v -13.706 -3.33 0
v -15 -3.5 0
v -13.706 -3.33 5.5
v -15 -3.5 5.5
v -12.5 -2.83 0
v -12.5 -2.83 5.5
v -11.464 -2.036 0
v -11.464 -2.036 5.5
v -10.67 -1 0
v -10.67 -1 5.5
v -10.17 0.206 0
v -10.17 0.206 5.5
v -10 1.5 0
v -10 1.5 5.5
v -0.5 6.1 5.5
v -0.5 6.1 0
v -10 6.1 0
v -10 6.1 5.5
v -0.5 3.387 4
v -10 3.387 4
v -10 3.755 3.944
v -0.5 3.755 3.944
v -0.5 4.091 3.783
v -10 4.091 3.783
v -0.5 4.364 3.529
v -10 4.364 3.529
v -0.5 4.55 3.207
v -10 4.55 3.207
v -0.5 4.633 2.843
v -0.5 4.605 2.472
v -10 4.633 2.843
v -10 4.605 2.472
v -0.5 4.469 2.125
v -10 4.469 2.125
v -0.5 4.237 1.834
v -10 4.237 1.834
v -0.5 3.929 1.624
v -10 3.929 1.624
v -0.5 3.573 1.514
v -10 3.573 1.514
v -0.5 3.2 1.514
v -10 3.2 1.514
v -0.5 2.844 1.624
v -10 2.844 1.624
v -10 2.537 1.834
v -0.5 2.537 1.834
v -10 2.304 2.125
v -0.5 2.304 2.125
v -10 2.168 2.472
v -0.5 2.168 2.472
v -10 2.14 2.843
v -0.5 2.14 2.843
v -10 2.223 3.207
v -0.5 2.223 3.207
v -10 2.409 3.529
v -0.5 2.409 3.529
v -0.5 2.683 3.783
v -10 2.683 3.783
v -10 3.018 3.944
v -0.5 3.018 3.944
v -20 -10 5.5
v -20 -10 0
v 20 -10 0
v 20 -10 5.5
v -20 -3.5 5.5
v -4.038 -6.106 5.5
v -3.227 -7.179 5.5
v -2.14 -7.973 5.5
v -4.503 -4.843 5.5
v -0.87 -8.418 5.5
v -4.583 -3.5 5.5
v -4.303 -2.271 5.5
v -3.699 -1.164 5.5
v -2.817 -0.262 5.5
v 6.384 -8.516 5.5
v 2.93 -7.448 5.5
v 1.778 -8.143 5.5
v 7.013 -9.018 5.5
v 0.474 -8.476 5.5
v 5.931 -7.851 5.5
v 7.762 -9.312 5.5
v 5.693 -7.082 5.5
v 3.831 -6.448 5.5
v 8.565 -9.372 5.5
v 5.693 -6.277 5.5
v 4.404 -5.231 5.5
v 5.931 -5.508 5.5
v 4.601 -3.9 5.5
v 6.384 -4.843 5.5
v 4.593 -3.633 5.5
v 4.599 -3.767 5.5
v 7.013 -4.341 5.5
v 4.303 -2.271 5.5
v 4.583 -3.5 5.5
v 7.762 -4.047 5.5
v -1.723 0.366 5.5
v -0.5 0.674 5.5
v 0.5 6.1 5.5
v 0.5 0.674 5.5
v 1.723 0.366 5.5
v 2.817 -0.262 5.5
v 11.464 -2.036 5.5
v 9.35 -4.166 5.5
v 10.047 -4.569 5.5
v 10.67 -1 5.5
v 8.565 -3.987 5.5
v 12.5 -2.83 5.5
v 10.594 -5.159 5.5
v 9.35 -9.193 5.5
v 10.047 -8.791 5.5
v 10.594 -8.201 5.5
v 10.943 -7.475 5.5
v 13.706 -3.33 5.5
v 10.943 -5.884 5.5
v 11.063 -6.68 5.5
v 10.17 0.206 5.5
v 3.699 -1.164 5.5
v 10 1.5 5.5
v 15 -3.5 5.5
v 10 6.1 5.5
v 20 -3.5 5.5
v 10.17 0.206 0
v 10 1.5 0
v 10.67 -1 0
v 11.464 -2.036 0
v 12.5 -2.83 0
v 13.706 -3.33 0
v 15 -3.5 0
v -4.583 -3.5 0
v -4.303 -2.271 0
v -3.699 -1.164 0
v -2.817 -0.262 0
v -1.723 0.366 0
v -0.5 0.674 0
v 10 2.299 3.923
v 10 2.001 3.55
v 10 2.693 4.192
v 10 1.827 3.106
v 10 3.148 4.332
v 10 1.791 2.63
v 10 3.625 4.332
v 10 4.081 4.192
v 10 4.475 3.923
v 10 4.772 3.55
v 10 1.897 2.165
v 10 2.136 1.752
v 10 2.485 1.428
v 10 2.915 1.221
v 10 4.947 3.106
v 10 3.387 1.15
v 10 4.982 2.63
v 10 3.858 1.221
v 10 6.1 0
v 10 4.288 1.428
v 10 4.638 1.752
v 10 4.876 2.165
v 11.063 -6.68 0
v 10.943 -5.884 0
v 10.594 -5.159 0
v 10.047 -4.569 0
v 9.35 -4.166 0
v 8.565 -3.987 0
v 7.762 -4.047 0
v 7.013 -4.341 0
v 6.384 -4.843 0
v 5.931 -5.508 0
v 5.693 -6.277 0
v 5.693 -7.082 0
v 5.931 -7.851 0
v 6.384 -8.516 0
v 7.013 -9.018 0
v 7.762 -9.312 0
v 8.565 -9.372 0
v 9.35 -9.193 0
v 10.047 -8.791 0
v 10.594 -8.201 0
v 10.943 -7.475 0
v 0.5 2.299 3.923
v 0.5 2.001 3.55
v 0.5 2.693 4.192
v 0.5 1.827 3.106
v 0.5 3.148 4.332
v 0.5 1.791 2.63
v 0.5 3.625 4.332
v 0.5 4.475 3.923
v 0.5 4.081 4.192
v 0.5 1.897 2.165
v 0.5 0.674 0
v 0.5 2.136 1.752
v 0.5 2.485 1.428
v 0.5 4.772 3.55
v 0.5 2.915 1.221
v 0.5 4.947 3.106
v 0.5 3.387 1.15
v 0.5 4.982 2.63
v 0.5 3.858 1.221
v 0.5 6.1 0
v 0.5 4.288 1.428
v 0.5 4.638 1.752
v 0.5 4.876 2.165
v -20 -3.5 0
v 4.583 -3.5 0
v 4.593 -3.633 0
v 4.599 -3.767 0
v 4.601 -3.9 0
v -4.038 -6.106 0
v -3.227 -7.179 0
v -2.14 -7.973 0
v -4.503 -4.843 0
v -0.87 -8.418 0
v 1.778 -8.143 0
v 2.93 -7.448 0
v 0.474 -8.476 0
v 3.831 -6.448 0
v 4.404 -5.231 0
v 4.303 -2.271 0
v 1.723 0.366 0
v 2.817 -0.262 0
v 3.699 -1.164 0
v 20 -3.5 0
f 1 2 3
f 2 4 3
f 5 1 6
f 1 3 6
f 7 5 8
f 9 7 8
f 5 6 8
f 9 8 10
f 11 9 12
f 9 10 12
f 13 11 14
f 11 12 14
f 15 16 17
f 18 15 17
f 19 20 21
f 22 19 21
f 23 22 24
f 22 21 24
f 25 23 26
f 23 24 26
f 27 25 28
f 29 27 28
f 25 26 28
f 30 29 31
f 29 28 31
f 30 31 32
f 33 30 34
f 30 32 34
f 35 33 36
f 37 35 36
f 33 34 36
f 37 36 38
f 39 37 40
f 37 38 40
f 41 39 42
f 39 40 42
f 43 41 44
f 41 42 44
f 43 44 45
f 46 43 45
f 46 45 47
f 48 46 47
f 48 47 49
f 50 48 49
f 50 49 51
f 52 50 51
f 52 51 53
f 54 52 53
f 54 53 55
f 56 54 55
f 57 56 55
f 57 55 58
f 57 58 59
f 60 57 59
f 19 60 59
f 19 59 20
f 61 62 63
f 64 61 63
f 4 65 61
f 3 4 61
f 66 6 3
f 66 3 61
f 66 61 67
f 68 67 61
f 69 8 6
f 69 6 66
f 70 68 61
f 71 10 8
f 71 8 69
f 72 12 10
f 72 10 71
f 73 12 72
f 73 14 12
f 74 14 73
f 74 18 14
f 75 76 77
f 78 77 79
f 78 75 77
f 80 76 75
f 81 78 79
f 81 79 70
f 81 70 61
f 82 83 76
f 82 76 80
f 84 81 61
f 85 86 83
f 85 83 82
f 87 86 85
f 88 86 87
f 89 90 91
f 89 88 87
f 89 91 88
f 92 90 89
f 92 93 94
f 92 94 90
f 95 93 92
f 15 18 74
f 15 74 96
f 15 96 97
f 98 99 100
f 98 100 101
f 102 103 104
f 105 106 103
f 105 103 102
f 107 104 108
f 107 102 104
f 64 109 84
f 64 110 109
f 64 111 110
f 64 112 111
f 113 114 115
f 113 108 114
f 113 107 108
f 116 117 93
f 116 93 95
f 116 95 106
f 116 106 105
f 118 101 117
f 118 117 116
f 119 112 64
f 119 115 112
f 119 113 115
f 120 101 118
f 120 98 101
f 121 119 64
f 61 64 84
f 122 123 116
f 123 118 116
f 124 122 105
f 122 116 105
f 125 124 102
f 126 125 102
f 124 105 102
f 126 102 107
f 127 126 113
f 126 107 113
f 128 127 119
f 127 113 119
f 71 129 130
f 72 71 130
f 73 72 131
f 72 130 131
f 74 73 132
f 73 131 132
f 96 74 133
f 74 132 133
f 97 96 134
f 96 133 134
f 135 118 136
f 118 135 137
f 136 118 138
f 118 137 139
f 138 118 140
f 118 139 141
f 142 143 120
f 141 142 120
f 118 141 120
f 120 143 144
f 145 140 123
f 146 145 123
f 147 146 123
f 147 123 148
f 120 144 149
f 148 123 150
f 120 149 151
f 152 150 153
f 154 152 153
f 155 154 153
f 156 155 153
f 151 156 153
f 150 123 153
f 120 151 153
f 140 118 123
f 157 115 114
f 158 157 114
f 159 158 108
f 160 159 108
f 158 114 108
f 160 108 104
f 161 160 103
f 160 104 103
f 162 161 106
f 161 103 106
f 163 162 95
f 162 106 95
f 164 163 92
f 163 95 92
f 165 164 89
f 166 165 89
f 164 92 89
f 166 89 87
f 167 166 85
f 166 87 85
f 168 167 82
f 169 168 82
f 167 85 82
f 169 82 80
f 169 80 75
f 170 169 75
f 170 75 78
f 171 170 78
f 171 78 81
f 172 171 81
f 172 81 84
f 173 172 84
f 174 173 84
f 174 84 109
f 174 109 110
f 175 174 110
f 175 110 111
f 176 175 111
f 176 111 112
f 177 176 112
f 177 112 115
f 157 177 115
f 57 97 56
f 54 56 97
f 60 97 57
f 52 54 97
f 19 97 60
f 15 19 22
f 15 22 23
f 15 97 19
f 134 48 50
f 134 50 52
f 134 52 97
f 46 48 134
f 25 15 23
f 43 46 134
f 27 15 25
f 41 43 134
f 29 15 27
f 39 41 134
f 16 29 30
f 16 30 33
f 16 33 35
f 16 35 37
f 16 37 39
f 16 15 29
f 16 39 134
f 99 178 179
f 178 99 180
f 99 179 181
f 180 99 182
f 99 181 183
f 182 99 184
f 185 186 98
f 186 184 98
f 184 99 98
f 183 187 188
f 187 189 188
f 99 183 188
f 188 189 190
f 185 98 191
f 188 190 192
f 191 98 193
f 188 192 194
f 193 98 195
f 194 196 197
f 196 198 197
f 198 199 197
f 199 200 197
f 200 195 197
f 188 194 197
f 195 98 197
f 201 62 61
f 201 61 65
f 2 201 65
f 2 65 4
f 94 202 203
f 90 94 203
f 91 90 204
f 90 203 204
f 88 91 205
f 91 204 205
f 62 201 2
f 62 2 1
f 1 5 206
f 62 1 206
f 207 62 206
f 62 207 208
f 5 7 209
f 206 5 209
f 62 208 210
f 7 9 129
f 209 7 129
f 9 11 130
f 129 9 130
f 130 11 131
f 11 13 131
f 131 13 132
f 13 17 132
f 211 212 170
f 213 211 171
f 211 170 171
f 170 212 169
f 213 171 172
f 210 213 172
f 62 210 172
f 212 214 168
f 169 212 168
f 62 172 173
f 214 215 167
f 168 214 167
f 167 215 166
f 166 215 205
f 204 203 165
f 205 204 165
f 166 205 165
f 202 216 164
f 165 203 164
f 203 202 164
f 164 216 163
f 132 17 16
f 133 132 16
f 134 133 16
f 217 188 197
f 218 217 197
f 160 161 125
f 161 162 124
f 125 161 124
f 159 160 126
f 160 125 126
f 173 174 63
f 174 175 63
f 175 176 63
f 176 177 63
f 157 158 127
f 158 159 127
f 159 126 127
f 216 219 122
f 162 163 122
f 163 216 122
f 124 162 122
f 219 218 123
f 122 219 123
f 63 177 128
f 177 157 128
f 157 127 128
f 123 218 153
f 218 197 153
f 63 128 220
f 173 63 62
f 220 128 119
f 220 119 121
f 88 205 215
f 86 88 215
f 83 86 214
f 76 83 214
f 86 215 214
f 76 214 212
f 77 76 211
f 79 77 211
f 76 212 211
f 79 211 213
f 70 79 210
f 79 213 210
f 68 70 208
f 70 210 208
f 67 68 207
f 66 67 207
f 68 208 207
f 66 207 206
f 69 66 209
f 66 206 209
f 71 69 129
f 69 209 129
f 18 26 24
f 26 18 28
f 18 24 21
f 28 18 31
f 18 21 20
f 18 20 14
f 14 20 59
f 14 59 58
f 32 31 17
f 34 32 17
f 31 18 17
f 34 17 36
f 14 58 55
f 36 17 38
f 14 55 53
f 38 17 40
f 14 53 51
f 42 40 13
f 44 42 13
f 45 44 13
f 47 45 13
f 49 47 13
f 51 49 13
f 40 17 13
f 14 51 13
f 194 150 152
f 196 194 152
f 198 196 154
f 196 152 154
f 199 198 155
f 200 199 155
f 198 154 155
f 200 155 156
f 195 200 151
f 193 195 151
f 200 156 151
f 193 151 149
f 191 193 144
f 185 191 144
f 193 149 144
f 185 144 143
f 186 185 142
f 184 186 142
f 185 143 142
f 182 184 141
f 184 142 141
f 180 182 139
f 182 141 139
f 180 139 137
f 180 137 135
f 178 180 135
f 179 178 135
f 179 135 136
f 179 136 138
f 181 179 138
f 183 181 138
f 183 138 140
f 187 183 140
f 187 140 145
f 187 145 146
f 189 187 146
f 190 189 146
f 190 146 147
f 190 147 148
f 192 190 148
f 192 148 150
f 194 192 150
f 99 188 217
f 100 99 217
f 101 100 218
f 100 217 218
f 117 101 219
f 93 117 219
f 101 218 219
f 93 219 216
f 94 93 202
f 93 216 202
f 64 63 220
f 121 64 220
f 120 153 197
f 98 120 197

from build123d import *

# Parameters (mm, degrees)
SZKIC1_W                        = 10
SZKIC1_H                        = 6.5
DODANIE_WYCI_GNI_CIE1_DEPTH     = 5.5
WYTNIJ_WYCI_GNI_CIE1_REACH      = 28.258
WYTNIJ_WYCI_GNI_CIE1_END_RADIUS = 4.600818815
SZKIC2_W                        = 1
SZKIC2_H                        = 5.5
OTW_R_GWINTOWANY_M3X0_51_D      = 2.5
OTW_R_POD_RUB_M31_REACH         = 34.098
OTW_R_POD_RUB_M31_BORE_R        = 1.6
SZKIC10_R                       = 2.7
WYTNIJ_WYCI_GNI_CIE2_DEPTH      = 24.027157879
ZAOKR_GLENIE1_R                 = 5


with BuildPart() as part:
    # Szkic1 → Dodanie-wyciągnięcie1 (new body)
    with BuildSketch(Plane.XY):
        with BuildLine():
            Line((10, 6.1), (-10, 6.1))
            Line((-10, 6.1), (-10, -3.5))
            Line((-10, -3.5), (-4.583397623, -3.5))
            ThreePointArc((-4.583397623, -3.5), (0, 0.700818815), (4.583397623, -3.5))
            Line((4.583397623, -3.5), (10, -3.5))
            Line((10, -3.5), (10, 6.1))
        make_face()
        with Locations((-15, -6.75)):
            Rectangle(SZKIC1_W, SZKIC1_H)
        with BuildLine():
            Line((-4.583397623, -3.5), (-10, -3.5))
            Line((-10, -3.5), (-10, -10))
            Line((-10, -10), (10, -10))
            Line((10, -10), (10, -3.5))
            Line((10, -3.5), (4.583397623, -3.5))
            ThreePointArc((4.583397623, -3.5), (4.596461454, -3.699810404), (4.600818815, -3.9))
            ThreePointArc((4.600818815, -3.9), (-0.200189596, -8.496461454), (-4.583397623, -3.5))
        make_face()
        with Locations((15, -6.75)):
            Rectangle(SZKIC1_W, SZKIC1_H)
    extrude(amount=DODANIE_WYCI_GNI_CIE1_DEPTH)

    # Wytnij-wyciągnięcie1: up to this cylinder (the profile starts outside it)
    wytnij_wyci_gni_cie1_end = Plane(origin=(0, -3.9, 2.75), z_dir=(0, 0, -1)) * Cylinder(WYTNIJ_WYCI_GNI_CIE1_END_RADIUS, 66.717637631, mode=Mode.PRIVATE)
    # Szkic2 → Wytnij-wyciągnięcie1 (cut, up to the surface)
    with BuildSketch(Plane(origin=(0, 6.1, 0), x_dir=(1, 0, 0), z_dir=(0, 1, 0)), mode=Mode.PRIVATE) as wytnij_wyci_gni_cie1_sk1:
        with Locations((0, -2.75)):
            Rectangle(SZKIC2_W, SZKIC2_H)
    wytnij_wyci_gni_cie1_tool1 = extrude(wytnij_wyci_gni_cie1_sk1.sketch, amount=-WYTNIJ_WYCI_GNI_CIE1_REACH, mode=Mode.PRIVATE) - wytnij_wyci_gni_cie1_end
    add(wytnij_wyci_gni_cie1_tool1.solids().sort_by_distance((0, 6.1, 2.75))[0], mode=Mode.SUBTRACT)

    # Otwór gwintowany M3x0.51 (through all)
    with Locations(Plane(origin=(10, 0, 0), x_dir=(0, 0, -1), z_dir=(1, 0, 0))):
        with Locations((-2.75, 3.38678452)):
            Hole(OTW_R_GWINTOWANY_M3X0_51_D / 2)

    # Otwór pod śrubę M31 bore → Otwór pod śrubę M31 (cut, up to next)
    with BuildSketch(Plane(origin=(10, 0, 0), x_dir=(0, 0, -1), z_dir=(1, 0, 0)), mode=Mode.PRIVATE) as otw_r_pod_rub_m31_sk1:
        with Locations((-2.75, 3.38678452)):
            Circle(OTW_R_POD_RUB_M31_BORE_R)
    otw_r_pod_rub_m31_tool1 = extrude(otw_r_pod_rub_m31_sk1.sketch, amount=-OTW_R_POD_RUB_M31_REACH, mode=Mode.PRIVATE) & part.part
    add(otw_r_pod_rub_m31_tool1.solids().sort_by_distance((10, 3.386785, 2.75))[0], mode=Mode.SUBTRACT)

    # Szkic10 → Wytnij-wyciągnięcie2 (cut, through all)
    with BuildSketch(Plane.XY.offset(5.5)):
        with Locations((8.363131331, -6.679576829)):
            Circle(SZKIC10_R)
    extrude(amount=-WYTNIJ_WYCI_GNI_CIE2_DEPTH, mode=Mode.SUBTRACT)

    # Zaokrąglenie1
    zaokr_glenie1_edges = [part.edges().sort_by_distance(p)[0] for p in [
        (-10, -3.5, 2.75),
        (10, -3.5, 2.75),
    ]]
    fillet(zaokr_glenie1_edges, radius=ZAOKR_GLENIE1_R)


solid = part.part
